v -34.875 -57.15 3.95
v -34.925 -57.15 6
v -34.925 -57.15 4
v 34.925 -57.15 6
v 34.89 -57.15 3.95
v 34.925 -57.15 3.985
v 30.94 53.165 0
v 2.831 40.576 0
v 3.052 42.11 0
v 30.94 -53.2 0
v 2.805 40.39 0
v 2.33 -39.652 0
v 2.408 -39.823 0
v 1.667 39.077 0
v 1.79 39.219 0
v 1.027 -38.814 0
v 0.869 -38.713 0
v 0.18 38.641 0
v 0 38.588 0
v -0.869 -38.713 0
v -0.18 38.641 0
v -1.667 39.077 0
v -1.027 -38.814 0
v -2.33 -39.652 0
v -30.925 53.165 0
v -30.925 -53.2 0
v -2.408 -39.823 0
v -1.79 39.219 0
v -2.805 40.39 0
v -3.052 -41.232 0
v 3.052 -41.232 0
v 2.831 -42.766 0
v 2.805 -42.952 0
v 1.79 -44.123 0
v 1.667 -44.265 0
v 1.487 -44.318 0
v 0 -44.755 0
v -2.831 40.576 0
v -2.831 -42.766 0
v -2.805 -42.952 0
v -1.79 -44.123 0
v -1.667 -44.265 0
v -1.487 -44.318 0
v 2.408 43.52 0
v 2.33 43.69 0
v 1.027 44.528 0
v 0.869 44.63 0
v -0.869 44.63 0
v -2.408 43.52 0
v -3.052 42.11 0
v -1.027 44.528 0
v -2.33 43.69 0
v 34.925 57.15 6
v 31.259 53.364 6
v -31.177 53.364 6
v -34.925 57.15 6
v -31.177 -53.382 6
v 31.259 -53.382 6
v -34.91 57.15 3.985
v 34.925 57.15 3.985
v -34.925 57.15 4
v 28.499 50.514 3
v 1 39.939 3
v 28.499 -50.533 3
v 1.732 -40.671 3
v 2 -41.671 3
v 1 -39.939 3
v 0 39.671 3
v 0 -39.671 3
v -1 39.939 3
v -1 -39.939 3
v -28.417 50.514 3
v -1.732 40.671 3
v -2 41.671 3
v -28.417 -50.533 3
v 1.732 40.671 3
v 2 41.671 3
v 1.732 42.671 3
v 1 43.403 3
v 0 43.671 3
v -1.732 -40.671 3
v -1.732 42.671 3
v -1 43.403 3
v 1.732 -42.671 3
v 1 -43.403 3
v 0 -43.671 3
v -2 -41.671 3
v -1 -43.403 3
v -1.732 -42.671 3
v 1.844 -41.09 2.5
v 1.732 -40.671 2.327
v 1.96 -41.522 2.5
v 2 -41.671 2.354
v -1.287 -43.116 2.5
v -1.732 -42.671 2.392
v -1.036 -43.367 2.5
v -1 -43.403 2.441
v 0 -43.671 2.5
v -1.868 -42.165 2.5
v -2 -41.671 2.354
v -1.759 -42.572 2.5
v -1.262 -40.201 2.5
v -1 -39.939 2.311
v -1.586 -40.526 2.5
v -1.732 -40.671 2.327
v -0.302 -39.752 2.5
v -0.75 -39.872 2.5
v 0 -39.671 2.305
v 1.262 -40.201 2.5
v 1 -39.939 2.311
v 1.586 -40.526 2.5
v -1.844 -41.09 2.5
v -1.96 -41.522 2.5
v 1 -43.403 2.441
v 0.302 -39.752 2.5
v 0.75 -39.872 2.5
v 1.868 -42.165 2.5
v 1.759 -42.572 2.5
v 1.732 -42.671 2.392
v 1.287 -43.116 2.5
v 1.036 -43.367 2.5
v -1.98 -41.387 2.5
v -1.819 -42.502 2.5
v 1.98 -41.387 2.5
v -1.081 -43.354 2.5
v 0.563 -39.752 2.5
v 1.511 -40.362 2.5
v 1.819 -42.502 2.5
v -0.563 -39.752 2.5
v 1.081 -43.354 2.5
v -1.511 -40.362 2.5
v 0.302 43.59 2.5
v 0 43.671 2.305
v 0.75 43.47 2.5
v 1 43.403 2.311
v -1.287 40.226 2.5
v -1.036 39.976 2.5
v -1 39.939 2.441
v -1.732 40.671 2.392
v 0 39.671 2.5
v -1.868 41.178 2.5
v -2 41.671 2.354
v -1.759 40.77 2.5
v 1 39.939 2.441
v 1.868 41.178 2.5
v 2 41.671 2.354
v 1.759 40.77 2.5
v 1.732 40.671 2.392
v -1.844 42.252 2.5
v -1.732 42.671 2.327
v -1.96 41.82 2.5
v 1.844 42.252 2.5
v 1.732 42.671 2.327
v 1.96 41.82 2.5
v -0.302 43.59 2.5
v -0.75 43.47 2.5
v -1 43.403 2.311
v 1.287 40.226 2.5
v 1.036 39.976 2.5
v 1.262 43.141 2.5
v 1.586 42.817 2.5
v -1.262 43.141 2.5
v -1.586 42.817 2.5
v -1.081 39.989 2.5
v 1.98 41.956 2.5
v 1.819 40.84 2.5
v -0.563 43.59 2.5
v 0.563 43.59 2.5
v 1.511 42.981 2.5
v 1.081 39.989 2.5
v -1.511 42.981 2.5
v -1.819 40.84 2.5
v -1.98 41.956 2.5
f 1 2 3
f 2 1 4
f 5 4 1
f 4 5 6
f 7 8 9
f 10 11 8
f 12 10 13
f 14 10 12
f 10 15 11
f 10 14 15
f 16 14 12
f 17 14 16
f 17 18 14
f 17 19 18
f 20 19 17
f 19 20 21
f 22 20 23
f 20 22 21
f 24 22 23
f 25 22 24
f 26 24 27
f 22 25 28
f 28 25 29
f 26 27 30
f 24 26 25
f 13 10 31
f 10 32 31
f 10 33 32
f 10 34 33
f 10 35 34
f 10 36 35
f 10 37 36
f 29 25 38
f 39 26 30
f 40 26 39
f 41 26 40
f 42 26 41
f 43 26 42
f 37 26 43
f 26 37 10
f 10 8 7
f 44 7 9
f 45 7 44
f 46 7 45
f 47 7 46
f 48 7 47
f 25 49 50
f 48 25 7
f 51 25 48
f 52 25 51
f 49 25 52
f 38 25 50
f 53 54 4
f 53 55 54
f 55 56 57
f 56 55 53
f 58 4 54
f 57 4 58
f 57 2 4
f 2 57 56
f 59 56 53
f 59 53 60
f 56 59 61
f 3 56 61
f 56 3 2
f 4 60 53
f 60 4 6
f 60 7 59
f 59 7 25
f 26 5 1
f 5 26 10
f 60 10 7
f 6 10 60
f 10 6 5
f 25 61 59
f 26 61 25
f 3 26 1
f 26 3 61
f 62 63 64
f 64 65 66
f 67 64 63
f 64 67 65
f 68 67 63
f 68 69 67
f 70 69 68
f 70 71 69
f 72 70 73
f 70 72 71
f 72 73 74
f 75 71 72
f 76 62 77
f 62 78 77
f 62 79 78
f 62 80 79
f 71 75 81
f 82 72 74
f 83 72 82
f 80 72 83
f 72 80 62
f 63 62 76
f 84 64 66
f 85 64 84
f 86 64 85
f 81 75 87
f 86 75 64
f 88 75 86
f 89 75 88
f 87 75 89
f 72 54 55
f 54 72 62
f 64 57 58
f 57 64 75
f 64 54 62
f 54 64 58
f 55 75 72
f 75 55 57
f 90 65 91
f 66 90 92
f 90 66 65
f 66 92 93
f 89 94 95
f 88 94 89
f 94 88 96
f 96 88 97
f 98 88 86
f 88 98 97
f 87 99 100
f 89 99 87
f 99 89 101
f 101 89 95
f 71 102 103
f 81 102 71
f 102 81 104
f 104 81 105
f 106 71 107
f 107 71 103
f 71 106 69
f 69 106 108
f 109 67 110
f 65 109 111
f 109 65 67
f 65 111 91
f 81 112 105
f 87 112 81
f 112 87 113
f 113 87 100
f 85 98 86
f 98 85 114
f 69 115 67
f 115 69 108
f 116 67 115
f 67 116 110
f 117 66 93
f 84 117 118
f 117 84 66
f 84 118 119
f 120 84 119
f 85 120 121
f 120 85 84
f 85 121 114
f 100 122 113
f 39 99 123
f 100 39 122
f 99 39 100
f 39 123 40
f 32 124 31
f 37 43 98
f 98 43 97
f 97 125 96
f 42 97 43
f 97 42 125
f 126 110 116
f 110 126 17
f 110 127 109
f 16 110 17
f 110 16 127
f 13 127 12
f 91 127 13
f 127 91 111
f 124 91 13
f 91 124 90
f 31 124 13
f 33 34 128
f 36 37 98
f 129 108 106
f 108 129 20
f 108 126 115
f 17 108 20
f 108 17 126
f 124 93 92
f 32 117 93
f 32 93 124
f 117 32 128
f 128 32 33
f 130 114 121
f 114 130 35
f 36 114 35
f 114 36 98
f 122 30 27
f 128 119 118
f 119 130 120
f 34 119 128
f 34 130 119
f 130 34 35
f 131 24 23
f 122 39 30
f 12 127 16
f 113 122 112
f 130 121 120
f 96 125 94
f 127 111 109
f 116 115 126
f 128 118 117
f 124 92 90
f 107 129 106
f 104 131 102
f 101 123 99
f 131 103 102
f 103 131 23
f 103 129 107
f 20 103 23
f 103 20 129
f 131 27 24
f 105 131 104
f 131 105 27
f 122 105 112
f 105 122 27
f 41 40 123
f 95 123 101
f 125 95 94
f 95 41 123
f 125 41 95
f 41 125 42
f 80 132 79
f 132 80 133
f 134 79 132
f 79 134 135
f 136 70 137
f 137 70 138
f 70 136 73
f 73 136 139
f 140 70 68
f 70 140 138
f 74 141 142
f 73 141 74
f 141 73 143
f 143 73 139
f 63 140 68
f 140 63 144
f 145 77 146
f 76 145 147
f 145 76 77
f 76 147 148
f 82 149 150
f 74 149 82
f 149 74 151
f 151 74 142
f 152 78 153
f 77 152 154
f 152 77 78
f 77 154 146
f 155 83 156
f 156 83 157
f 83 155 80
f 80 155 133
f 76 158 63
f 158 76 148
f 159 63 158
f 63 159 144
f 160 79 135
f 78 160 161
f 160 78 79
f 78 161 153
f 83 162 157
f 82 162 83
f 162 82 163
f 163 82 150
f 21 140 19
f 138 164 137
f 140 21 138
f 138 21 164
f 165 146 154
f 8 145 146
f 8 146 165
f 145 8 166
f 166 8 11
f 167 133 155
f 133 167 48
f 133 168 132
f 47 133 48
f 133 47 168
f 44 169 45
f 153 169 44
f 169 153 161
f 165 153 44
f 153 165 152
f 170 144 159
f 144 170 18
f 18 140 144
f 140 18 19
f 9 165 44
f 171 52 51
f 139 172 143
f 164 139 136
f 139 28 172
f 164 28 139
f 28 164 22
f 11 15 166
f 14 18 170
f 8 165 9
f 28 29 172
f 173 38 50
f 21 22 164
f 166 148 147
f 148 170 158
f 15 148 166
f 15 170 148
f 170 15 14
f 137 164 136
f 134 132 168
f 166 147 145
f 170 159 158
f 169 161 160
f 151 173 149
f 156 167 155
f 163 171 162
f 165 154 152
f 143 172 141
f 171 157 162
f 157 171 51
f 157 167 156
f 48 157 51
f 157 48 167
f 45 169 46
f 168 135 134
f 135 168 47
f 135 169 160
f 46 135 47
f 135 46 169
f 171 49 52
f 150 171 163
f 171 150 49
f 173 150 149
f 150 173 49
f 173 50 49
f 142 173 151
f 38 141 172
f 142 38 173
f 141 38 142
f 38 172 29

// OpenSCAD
// WALLY - Wall Plate Customizer v1.4
// by TheNewHobbyist 2013 (http://thenewhobbyist.com)
// http://www.thingiverse.com/thing:47956
// Modified by PaperGeek to add recessed screw option
//
// Most of the connectors used with this thing are panel mount connectors from
// www.DataPro.net I can't vouch for their quality but they did have easy to
// find dimensions for their products so I used them.
//
// This could be tightened up considerably but I thought I'd get it out there for people
// to experiment with before I lose my mind staring at it too long. Also this is my
// first OpenSCAD model so cut me some slack ;)
//
//   Notes:
//
// * The plug types "Duplex Outlet", "Long_Toggle Switch", "Toggle Switch", and "Rocker"
//   will all use the entire plate when selected in top or bottom configuration. The
//   other selection (if not "none" will be selected.
//
// * "None" and "Blank should not be considered equal. if "None" is selected for one of
//   the two holes on a plate the other selection will be centered on that plate. If
//   "Blank" is selected that plug location will remain blank but the other selection
//   will NOT move into a centered position.
//
//	Change Log:
//
//	v1.1
//	UPDATED: Screw hole locations for designer and toggle plate types.
//	UPDATED: Hole size for designer plate type.
//	UPDATED: Outlet hole spacing
//
//	v1.2
//	ADDED: Long Toggle Switch for laird
//
//	v1.3
//	ADDED: 3 new sizes for plate export: Standard, Junior-Jumbo, and Jumbo.
//
//  v1.4
//  ADDED (PaperGeek): Recessed screw option

  //////////////////////////
 // Customizer Settings: //
//////////////////////////

//How big are we talkin' here?
plate_width = 1; //	[1:5]

// Bigger hole in your wall? Try this
plate_size = 0; // [0:Standard, 1:Junior-Jumbo, 2:Jumbo]

//Pick a plug or full plate type
1st_plate = "none";  //	["none":None, "blank":Blank Port, "toggle":Full Plate - Toggle Switch, "long_toggle":Full Plate - Long Toggle Switch, "outlet":Full Plate - Duplex Outlet, "rocker":Full Plate - Rocker/Designer Plate, "keystone1":Keystone Jack, "vga":VGA Port, "hdmi":HDMI Port, "dvi":DVI-I Port, "displayport":Displayport, "cat5e":Cat5e/Cat6 Port, "usb-a":USB-A Port, "usb-b":USB-B Port, "firewire":Firewire IEEE 1394 Port, "db09":DB-09 Port, "ps2":PS2 Port, "f-type": F-Type/Coaxial Port,"svideo":S-Video Port, "stereo":Stereo Headphone Jack]
//Pick a bottom plug type or leave as none
1st_plate_bottom_hole = "none";  //	["none":None, "blank":Blank Port, "keystone1":Keystone Jack, "vga":VGA Port, "hdmi":HDMI Port, "dvi":DVI-I Port, "displayport":Displayport, "cat5e":Cat5e/Cat6 Port, "usb-a":USB-A Port, "usb-b":USB-B Port, "firewire":Firewire IEEE 1394 Port, "db09":DB-09 Port, "ps2":PS2 Port, "f-type": F-Type/Coaxial Port,"svideo":S-Video Port, "stereo":Stereo Headphone Jack]
//Pick a plug or full plate type
2nd_plate = "none";  //	["none":None, "blank":Blank Port, "toggle":Full Plate - Toggle Switch, "long_toggle":Full Plate - Long Toggle Switch, "outlet":Full Plate - Duplex Outlet, "rocker":Full Plate - Rocker/Designer Plate, "keystone1":Keystone Jack, "vga":VGA Port, "hdmi":HDMI Port, "dvi":DVI-I Port, "displayport":Displayport, "cat5e":Cat5e/Cat6 Port, "usb-a":USB-A Port, "usb-b":USB-B Port, "firewire":Firewire IEEE 1394 Port, "db09":DB-09 Port, "ps2":PS2 Port, "f-type": F-Type/Coaxial Port,"svideo":S-Video Port, "stereo":Stereo Headphone Jack]
//Pick a bottom plug type or leave as none
2nd_plate_bottom_hole = "none";  //	["none":None, "blank":Blank Port, "keystone1":Keystone Jack, "vga":VGA Port, "hdmi":HDMI Port, "dvi":DVI-I Port, "displayport":Displayport, "cat5e":Cat5e/Cat6 Port, "usb-a":USB-A Port, "usb-b":USB-B Port, "firewire":Firewire IEEE 1394 Port, "db09":DB-09 Port, "ps2":PS2 Port, "f-type": F-Type/Coaxial Port,"svideo":S-Video Port, "stereo":Stereo Headphone Jack]
//Pick a plug or full plate type
3rd_plate = "none";  //	["none":None, "blank":Blank Port, "toggle":Full Plate - Toggle Switch, "long_toggle":Full Plate - Long Toggle Switch, "outlet":Full Plate - Duplex Outlet, "rocker":Full Plate - Rocker/Designer Plate, "keystone1":Keystone Jack, "vga":VGA Port, "hdmi":HDMI Port, "dvi":DVI-I Port, "displayport":Displayport, "cat5e":Cat5e/Cat6 Port, "usb-a":USB-A Port, "usb-b":USB-B Port, "firewire":Firewire IEEE 1394 Port, "db09":DB-09 Port, "ps2":PS2 Port, "f-type": F-Type/Coaxial Port,"svideo":S-Video Port, "stereo":Stereo Headphone Jack]
//Pick a bottom plug type or leave as none
3rd_plate_bottom_hole = "none";  //	["none":None, "blank":Blank Port, "keystone1":Keystone Jack, "vga":VGA Port, "hdmi":HDMI Port, "dvi":DVI-I Port, "displayport":Displayport, "cat5e":Cat5e/Cat6 Port, "usb-a":USB-A Port, "usb-b":USB-B Port, "firewire":Firewire IEEE 1394 Port, "db09":DB-09 Port, "ps2":PS2 Port, "f-type": F-Type/Coaxial Port,"svideo":S-Video Port, "stereo":Stereo Headphone Jack]
//Pick a plug or full plate type
4th_plate = "none";  //["none":None, "blank":Blank Port, "toggle":Full Plate - Toggle Switch, "long_toggle":Full Plate - Long Toggle Switch, "outlet":Full Plate - Duplex Outlet, "rocker":Full Plate - Rocker/Designer Plate, "keystone1":Keystone Jack, "vga":VGA Port, "hdmi":HDMI Port, "dvi":DVI-I Port, "displayport":Displayport, "cat5e":Cat5e/Cat6 Port, "usb-a":USB-A Port, "usb-b":USB-B Port, "firewire":Firewire IEEE 1394 Port, "db09":DB-09 Port, "ps2":PS2 Port, "f-type": F-Type/Coaxial Port,"svideo":S-Video Port, "stereo":Stereo Headphone Jack]
//Pick a bottom plug type or leave as none
4th_plate_bottom_hole = "none";  //	["none":None, "blank":Blank Port, "keystone1":Keystone Jack, "vga":VGA Port, "hdmi":HDMI Port, "dvi":DVI-I Port, "displayport":Displayport, "cat5e":Cat5e/Cat6 Port, "usb-a":USB-A Port, "usb-b":USB-B Port, "firewire":Firewire IEEE 1394 Port, "db09":DB-09 Port, "ps2":PS2 Port, "f-type": F-Type/Coaxial Port,"svideo":S-Video Port, "stereo":Stereo Headphone Jack]
//Pick a plug or full plate type
5th_plate = "none";  //["none":None, "blank":Blank Port, "toggle":Full Plate - Toggle Switch, "long_toggle":Full Plate - Long Toggle Switch, "outlet":Full Plate - Duplex Outlet, "rocker":Full Plate - Rocker/Designer Plate, "keystone1":Keystone Jack, "vga":VGA Port, "hdmi":HDMI Port, "dvi":DVI-I Port, "displayport":Displayport, "cat5e":Cat5e/Cat6 Port, "usb-a":USB-A Port, "usb-b":USB-B Port, "firewire":Firewire IEEE 1394 Port, "db09":DB-09 Port, "ps2":PS2 Port, "f-type": F-Type/Coaxial Port,"svideo":S-Video Port, "stereo":Stereo Headphone Jack]
//Pick a bottom plug type or leave as none
5th_plate_bottom_hole = "none";  //	["none":None, "blank":Blank Port, "keystone1":Keystone Jack, "vga":VGA Port, "hdmi":HDMI Port, "dvi":DVI-I Port, "displayport":Displayport, "cat5e":Cat5e/Cat6 Port, "usb-a":USB-A Port, "usb-b":USB-B Port, "firewire":Firewire IEEE 1394 Port, "db09":DB-09 Port, "ps2":PS2 Port, "f-type": F-Type/Coaxial Port,"svideo":S-Video Port, "stereo":Stereo Headphone Jack]

// Screws can't reach? Try increasing screwhole recess in mm
screwhole_recess = 0; // [0:10]

  //////////////////////
 // Static Settings: //
//////////////////////

module GoAwayCustomizer() {
// This module is here to stop Customizer from picking up the variables below
}

l_offset = [34.925,39.6875,44.45];
r_offset = [34.925,39.6875,44.45];
spacer = [0,0,46.0375,92.075,138.1125,184.15];
solid_plate_width = l_offset[plate_size] + spacer[plate_width] + r_offset[plate_size];

height_sizes = [114.3,123.825,133.35];

height = 114.3; //plate height (static)
gang_width=[0,69.86,115.824,161.925,206.375,254]; // Plate widths (standard)

edgewidth = solid_plate_width + 10; // Bevel setting for top and bottom
rightbevel = solid_plate_width - 4; // Bevel for right side (scales)

left_offset = 34.925; // Offset first hole position
switch_offset = 46.0375; // Offset all additional holes
thinner_offset=[0,0.92,0.95,0.96,0.97,0.973]; // Manual fix for right side wackiness

positions=[height_sizes[plate_size]/2,height_sizes[plate_size]/2 - 14.25,height_sizes[plate_size]/2 + 14.25];

// preview[view:north, tilt:bottom]

  ///////////////////
 // Hole Control: //
///////////////////

module plate1(){
	if (1st_plate == "toggle" || 1st_plate_bottom_hole == "toggle"){
		translate([0,l_offset[plate_size],-screwhole_recess]) toggle_screws();
		translate([0,l_offset[plate_size],0]) hole("toggle");
		}
	else if (1st_plate == "long_toggle" || 1st_plate_bottom_hole == "long_toggle"){
		translate([0,l_offset[plate_size],0]) toggle_screws();
		translate([0,l_offset[plate_size],0]) hole("long_toggle");
		}
	else if (1st_plate == "rocker" || 1st_plate_bottom_hole == "rocker"){
		translate([0,l_offset[plate_size],0]) rocker_screws();
		translate([0,l_offset[plate_size],0]) hole("rocker");
		}
	else if (1st_plate == "outlet" || 1st_plate_bottom_hole == "outlet") {
	translate([0,l_offset[plate_size],0]) hole("outlet");
	}
	else if (1st_plate_bottom_hole == "none") {
		translate([0,l_offset[plate_size],0]) box_screws();
		translate([positions[0],l_offset[plate_size],0]) hole(1st_plate);
			}
	else if (1st_plate == "none") {
		translate([0,l_offset[plate_size],0]) box_screws();
		translate([positions[0],l_offset[plate_size],0]) hole(1st_plate_bottom_hole);
			}
	else {
	translate([0,l_offset[plate_size],0]) box_screws();
	translate([positions[1],l_offset[plate_size],0]) hole(1st_plate);
	translate([positions[2],l_offset[plate_size],0]) hole(1st_plate_bottom_hole);
	}
}

module plate2(){
	if (2nd_plate == "toggle" || 2nd_plate_bottom_hole == "toggle"){
		translate([0,l_offset[plate_size] + switch_offset,0]) toggle_screws();
		translate([0,l_offset[plate_size] + switch_offset,0]) hole("toggle");
		}
	else if (2nd_plate == "long_toggle" || 2nd_plate_bottom_hole == "long_toggle"){
		translate([0,l_offset[plate_size] + switch_offset,0]) toggle_screws();
		translate([0,l_offset[plate_size] + switch_offset,0]) hole("long_toggle");
		}
	else if (2nd_plate == "rocker" || 2nd_plate_bottom_hole == "rocker"){
		translate([0,l_offset[plate_size] + switch_offset,0]) rocker_screws();
		translate([0,l_offset[plate_size] + switch_offset,0]) hole("rocker");
		}
	else if (2nd_plate == "outlet" || 2nd_plate_bottom_hole == "outlet") {
	translate([0,l_offset[plate_size] + switch_offset,0]) hole("outlet");
	}
	else if (2nd_plate_bottom_hole == "none") {
		translate([0,l_offset[plate_size] + switch_offset,0]) box_screws();
		translate([positions[0],l_offset[plate_size] + switch_offset,0]) hole(2nd_plate);
			}
	else if (2nd_plate == "none") {
		translate([0,l_offset[plate_size] + switch_offset,0]) box_screws();
		translate([positions[0],l_offset[plate_size] + switch_offset,0]) hole(2nd_plate_bottom_hole);
			}
	else {
	translate([0,l_offset[plate_size] + switch_offset,0]) box_screws();
	translate([positions[1],l_offset[plate_size] + switch_offset,0]) hole(2nd_plate);
	translate([positions[2],l_offset[plate_size] + switch_offset,0]) hole(2nd_plate_bottom_hole);
	}
}

module plate3(){
	if (3rd_plate == "toggle" || 3rd_plate_bottom_hole == "toggle"){
		translate([0,l_offset[plate_size] + switch_offset * 2,0]) toggle_screws();
		translate([0,l_offset[plate_size] + switch_offset * 2,0]) hole("toggle");
		}
	else if (3rd_plate == "long_toggle" || 3rd_plate_bottom_hole == "long_toggle"){
		translate([0,l_offset[plate_size] + switch_offset * 2,0]) toggle_screws();
		translate([0,l_offset[plate_size] + switch_offset * 2,0]) hole("long_toggle");
		}
	else if (3rd_plate == "rocker" || 3rd_plate_bottom_hole == "rocker"){
		translate([0,l_offset[plate_size] + switch_offset * 2,0]) rocker_screws();
		translate([0,l_offset[plate_size] + switch_offset * 2,0]) hole("rocker");
		}
	else if (3rd_plate == "outlet" || 3rd_plate_bottom_hole == "outlet") {
	translate([0,l_offset[plate_size] + switch_offset * 2,0]) hole("outlet");
	}
	else if (3rd_plate_bottom_hole == "none") {
		translate([0,l_offset[plate_size] + switch_offset * 2,0]) box_screws();
		translate([positions[0],l_offset[plate_size] + switch_offset * 2,0]) hole(3rd_plate);
			}
	else if (3rd_plate == "none") {
		translate([0,l_offset[plate_size] + switch_offset * 2,0]) box_screws();
		translate([positions[0],l_offset[plate_size] + switch_offset * 2,0]) hole(3rd_plate_bottom_hole);
			}
	else {
	translate([0,l_offset[plate_size] + switch_offset * 2,0]) box_screws();
	translate([positions[1],l_offset[plate_size] + switch_offset * 2,0]) hole(3rd_plate);
	translate([positions[2],l_offset[plate_size] + switch_offset * 2,0]) hole(3rd_plate_bottom_hole);
	}
}

module plate4(){
	if (4th_plate == "toggle" || 4th_plate_bottom_hole == "toggle"){
		translate([0,l_offset[plate_size] + switch_offset * 3,0]) toggle_screws();
		translate([0,l_offset[plate_size] + switch_offset * 3,0]) hole("toggle");
		}
	else if (4th_plate == "long_toggle" || 4th_plate_bottom_hole == "long_toggle"){
		translate([0,l_offset[plate_size] + switch_offset * 3,0]) toggle_screws();
		translate([0,l_offset[plate_size] + switch_offset * 3,0]) hole("long_toggle");
		}
	else if (4th_plate == "rocker" || 4th_plate_bottom_hole == "rocker"){
		translate([0,l_offset[plate_size] + switch_offset * 3,0]) rocker_screws();
		translate([0,l_offset[plate_size] + switch_offset * 3,0]) hole("rocker");
		}
	else if (4th_plate == "outlet" || 4th_plate_bottom_hole == "outlet") {
	translate([0,l_offset[plate_size] + switch_offset * 3,0]) hole("outlet");
	}
	else if (4th_plate_bottom_hole == "none") {
		translate([0,l_offset[plate_size] + switch_offset * 3,0]) box_screws();
		translate([positions[0],l_offset[plate_size] + switch_offset * 3,0]) hole(4th_plate);
			}
	else if (4th_plate == "none") {
		translate([0,l_offset[plate_size] + switch_offset * 3,0]) box_screws();
		translate([positions[0],l_offset[plate_size] + switch_offset * 3,0]) hole(4th_plate_bottom_hole);
			}
	else {
	translate([0,l_offset[plate_size] + switch_offset * 3,0]) box_screws();
	translate([positions[1],l_offset[plate_size] + switch_offset * 3,0]) hole(4th_plate);
	translate([positions[2],l_offset[plate_size] + switch_offset * 3,0]) hole(4th_plate_bottom_hole);
	}
}

module plate5(){
	if (5th_plate == "toggle" || 5th_plate_bottom_hole == "toggle"){
		translate([0,l_offset[plate_size] + switch_offset * 4,0]) toggle_screws();
		translate([0,l_offset[plate_size] + switch_offset * 4,0]) hole("toggle");
		}
	else if (5th_plate == "long_toggle" || 5th_plate_bottom_hole == "long_toggle"){
		translate([0,l_offset[plate_size] + switch_offset * 4,0]) toggle_screws();
		translate([0,l_offset[plate_size] + switch_offset * 4,0]) hole("long_toggle");
		}
	else if (5th_plate == "rocker" || 5th_plate_bottom_hole == "rocker"){
		translate([0,l_offset[plate_size] + switch_offset * 4,0]) rocker_screws();
		translate([0,l_offset[plate_size] + switch_offset * 4,0]) hole("rocker");
		}
	else if (5th_plate == "outlet" || 5th_plate_bottom_hole == "outlet") {
	translate([0,l_offset[plate_size] + switch_offset * 4,0]) hole("outlet");
	}
	else if (5th_plate_bottom_hole == "none") {
		translate([0,l_offset[plate_size] + switch_offset * 4,0]) box_screws();
		translate([positions[0],l_offset[plate_size] + switch_offset * 4,0]) hole(5th_plate);
			}
	else if (5th_plate == "none") {
		translate([0,l_offset[plate_size] + switch_offset * 4,0]) box_screws();
		translate([positions[0],l_offset[plate_size] + switch_offset * 4,0]) hole(5th_plate_bottom_hole);
			}
	else {
	translate([0,l_offset[plate_size] + switch_offset * 4,0]) box_screws();
	translate([positions[1],l_offset[plate_size] + switch_offset * 4,0]) hole(5th_plate);
	translate([positions[2],l_offset[plate_size] + switch_offset * 4,0]) hole(5th_plate_bottom_hole);
	}
}

  /////////////////
 // SolidWorks: //
/////////////////

module plate1_solid(){
if (1st_plate == "keystone1" && 1st_plate_bottom_hole == "none") {
	translate([height_sizes[plate_size]/2 + 14.3,l_offset[plate_size] - 11.5,-3.9]) hole("keystone_solid");
	}
else if (1st_plate == "keystone1" && 1st_plate_bottom_hole != "outlet" && 1st_plate_bottom_hole != "toggle" && 1st_plate_bottom_hole != "rocker") {
	translate([height_sizes[plate_size]/2,l_offset[plate_size] - 11.5,-3.9]) hole("keystone_solid");
	}
if (1st_plate_bottom_hole == "keystone1" && 1st_plate == "none") {
	translate([height_sizes[plate_size]/2 + 14.3,l_offset[plate_size] - 11.5,-3.9]) hole("keystone_solid");
	}
else if (1st_plate_bottom_hole == "keystone1" && 1st_plate != "outlet" && 1st_plate != "toggle" && 1st_plate != "rocker") {
	translate([height_sizes[plate_size]/2 + 28.5,l_offset[plate_size] - 11.5,-3.9]) hole("keystone_solid");
	}

}

module plate2_solid(){
if (2nd_plate == "keystone1" && 2nd_plate_bottom_hole == "none") {
	translate([height_sizes[plate_size]/2 + 14.3,l_offset[plate_size] - 11.5 + switch_offset,-3.9]) hole("keystone_solid");
	}
else if (2nd_plate == "keystone1" && 2nd_plate_bottom_hole != "outlet" && 2nd_plate_bottom_hole != "toggle" && 2nd_plate_bottom_hole != "rocker") {
	translate([height_sizes[plate_size]/2,l_offset[plate_size] - 11.5 + switch_offset,-3.9]) hole("keystone_solid");
	}
if (2nd_plate_bottom_hole == "keystone1" && 2nd_plate == "none") {
	translate([height_sizes[plate_size]/2 + 14.3,l_offset[plate_size] - 11.5 + switch_offset,-3.9]) hole("keystone_solid");
	}
else if (2nd_plate_bottom_hole == "keystone1" && 2nd_plate != "outlet" && 2nd_plate != "toggle" && 2nd_plate != "rocker") {
	translate([height_sizes[plate_size]/2 + 28.5,l_offset[plate_size] - 11.5 + switch_offset,-3.9]) hole("keystone_solid");
	}

}

module plate3_solid(){
if (3rd_plate == "keystone1" && 3rd_plate_bottom_hole == "none") {
	translate([height_sizes[plate_size]/2 + 14.3,l_offset[plate_size] - 11.5 + switch_offset * 2,-3.9]) hole("keystone_solid");
	}
else if (3rd_plate == "keystone1" && 3rd_plate_bottom_hole != "outlet" && 3rd_plate_bottom_hole != "toggle" && 3rd_plate_bottom_hole != "rocker") {
	translate([height_sizes[plate_size]/2,l_offset[plate_size] - 11.5 + switch_offset * 2,-3.9]) hole("keystone_solid");
	}
if (3rd_plate_bottom_hole == "keystone1" && 3rd_plate == "none") {
	translate([height_sizes[plate_size]/2 + 14.3,l_offset[plate_size] - 11.5 + switch_offset * 2,-3.9]) hole("keystone_solid");
	}
else if (3rd_plate_bottom_hole == "keystone1" && 3rd_plate != "outlet" && 3rd_plate != "toggle" && 3rd_plate != "rocker") {
	translate([height_sizes[plate_size]/2 + 28.5,l_offset[plate_size] - 11.5 + switch_offset * 2,-3.9]) hole("keystone_solid");
	}

}

module plate4_solid(){
if (4th_plate == "keystone1" && 4th_plate_bottom_hole == "none") {
	translate([height_sizes[plate_size]/2 + 14.3,l_offset[plate_size] - 11.5 + switch_offset * 3,-3.9]) hole("keystone_solid");
	}
else if (4th_plate == "keystone1" && 4th_plate_bottom_hole != "outlet" && 4th_plate_bottom_hole != "toggle" && 4th_plate_bottom_hole != "rocker") {
	translate([height_sizes[plate_size]/2,l_offset[plate_size] - 11.5 + switch_offset * 3,-3.9]) hole("keystone_solid");
	}
if (4th_plate_bottom_hole == "keystone1" && 4th_plate == "none") {
	translate([height_sizes[plate_size]/2 + 14.3,l_offset[plate_size] - 11.5 + switch_offset * 3,-3.9]) hole("keystone_solid");
	}
else if (4th_plate_bottom_hole == "keystone1" && 4th_plate != "outlet" && 4th_plate != "toggle" && 4th_plate != "rocker") {
	translate([height_sizes[plate_size]/2 + 28.5,l_offset[plate_size] - 11.5 + switch_offset * 3,-3.9]) hole("keystone_solid");
	}

}

module plate5_solid(){
if (5th_plate == "keystone1" && 5th_plate_bottom_hole == "none") {
	translate([height_sizes[plate_size]/2 + 14.3,l_offset[plate_size] - 11.5 + switch_offset * 4,-3.9]) hole("keystone_solid");
	}
else if (5th_plate == "keystone1" && 5th_plate_bottom_hole != "outlet" && 5th_plate_bottom_hole != "toggle" && 5th_plate_bottom_hole != "rocker") {
	translate([height_sizes[plate_size]/2,l_offset[plate_size] - 11.5 + switch_offset * 4,-3.9]) hole("keystone_solid");
	}
if (5th_plate_bottom_hole == "keystone1" && 5th_plate == "none") {
	translate([height_sizes[plate_size]/2 + 14.3,l_offset[plate_size] - 11.5 + switch_offset * 4,-3.9]) hole("keystone_solid");
	}
else if (5th_plate_bottom_hole == "keystone1" && 5th_plate != "outlet" && 5th_plate != "toggle" && 5th_plate != "rocker") {
	translate([height_sizes[plate_size]/2 + 28.5,l_offset[plate_size] - 11.5 + switch_offset * 4,-3.9]) hole("keystone_solid");
	}

}

  ///////////////////
 // PlateStation: //
///////////////////

//Plate size and bevel
module plate() {
  union() {
	difference() {
		cube([height_sizes[plate_size],solid_plate_width,6]);
		translate([-4.3,-5,6.2]) rotate([0,45,0]) cube([6,edgewidth,6]); //Top Bevel
		translate([height_sizes[plate_size]-4.2,-5,6.25]) rotate([0,45,0]) cube([6,edgewidth,6]); //Bottom Bevel
		translate([height_sizes[plate_size]+10,-4.4,6.1]) rotate([0,45,90]) cube([6,height_sizes[plate_size]+20,6]); //Left Bevel (doesn't change)
		translate([height_sizes[plate_size]+10,rightbevel,6]) rotate([0,45,90]) cube([6,height_sizes[plate_size]+10,6]); //Right Bevel (scales right)
	}
  }
}
  


// Thinning Plate
module plate_inner() {
	scale([0.95,thinner_offset[plate_width],1]){
	translate([3,3,0]){
	difference() {
		cube([height_sizes[plate_size],solid_plate_width,6]);
		translate([-4.3,-5,6.2]) rotate([0,45,0]) cube([6,edgewidth,6]); //Top Bevel
		translate([height_sizes[plate_size]-4.2,-5,6.25]) rotate([0,45,0]) cube([6,edgewidth,6]); //Bottom Bevel
		translate([height_sizes[plate_size]+10,-4.4,6.1]) rotate([0,45,90]) cube([6,height_sizes[plate_size]+20,6]); //Left Bevel (doesn't change)
		translate([height_sizes[plate_size]+10,rightbevel,6]) rotate([0,45,90]) cube([6,height_sizes[plate_size]+10,6]); //Right Bevel (scales right)
				}
			}
		}
	}

// Box screw holes
module box_screws(){
	 translate([height_sizes[plate_size]/2 + 41.67125,0,-1]) cylinder(r=2, h=10, $fn=12);
	 translate([height_sizes[plate_size]/2 + 41.67125,0,3.5]) cylinder(r1=2, r2=3.3, h=3);
	 translate([height_sizes[plate_size]/2 - 41.67125,0,-1]) cylinder(r=2, h=10, $fn=12);
	 translate([height_sizes[plate_size]/2 - 41.67125,0,3.5]) cylinder(r1=2, r2=3.3, h=3);
}

// Rocker/Designer screw holes
module rocker_screws(){
	 translate([height_sizes[plate_size]/2 + 48.41875,0,-1]) cylinder(r=2, h=10, $fn=12);
	 translate([height_sizes[plate_size]/2 + 48.41875,0,3.5]) cylinder(r1=2, r2=3.3, h=3);
	 translate([height_sizes[plate_size]/2 - 48.41875,0,-1]) cylinder(r=2, h=10, $fn=12);
	 translate([height_sizes[plate_size]/2 - 48.41875,0,3.5]) cylinder(r1=2, r2=3.3, h=3);
}

// Toggle screw holes
module toggle_screws(){
	 translate([height_sizes[plate_size]/2 + 30.1625,0,-1]) cylinder(r=2, h=10, $fn=12);
	 translate([height_sizes[plate_size]/2 + 30.1625,0,3.5]) cylinder(r1=2, r2=3.3, h=3);
     translate([height_sizes[plate_size]/2 + 30.1625,0,6.0]) cylinder(r=3.6, h=10);
	 translate([height_sizes[plate_size]/2 - 30.1625,0,-1]) cylinder(r=2, h=10, $fn=12);
	 translate([height_sizes[plate_size]/2 - 30.1625,0,3.5]) cylinder(r1=2, r2=3.3, h=3);
     translate([height_sizes[plate_size]/2 - 30.1625,0,6.0]) cylinder(r=3.6, h=10);
}

  ///////////////
 // Portland: //
///////////////

// Hole Cutout definitions
module hole(hole_type) {


// Toggle switch hole
	if (hole_type == "toggle") {
		translate([height_sizes[plate_size]/2,0,0]) cube([23.8125,10.3188,15], center = true);
		 						}

// Toggle switch hole and screw holes
	if (hole_type == "long_toggle") {
		translate([height_sizes[plate_size]/2,0,0]) cube([43.6563,11.9063,15], center = true);
		 						}

// Rocker switch plate
	if (hole_type == "rocker") {
		translate([height_sizes[plate_size]/2,0,0]) cube([67.1,33.3,15], center = true);

		 						}

// Duplex power outlet plate or dual side toggles
	if (hole_type == "outlet" || hole_type == "dualsidetoggle") {
		translate([height_sizes[plate_size]/2 + 19.3915,0,0]) {
			difference() {
				cylinder(r=17.4625, h=15, center = true);
				translate([-24.2875,-15,-2]) cube([10,37,15], center = false);
				translate([14.2875,-15,-2]) cube([10,37,15], center = false);
								}
							}
		translate([height_sizes[plate_size]/2 - 19.3915,0,0]){
			difference(){
				cylinder(r=17.4625, h=15, center = true);
				translate([-24.2875,-15,-2]) cube([10,37,15], center = false);
				translate([14.2875,-15,-2]) cube([10,37,15], center = false);
								}
							}
		translate([height_sizes[plate_size]/2,0,-1]) cylinder(r=2, h=10);
		translate([height_sizes[plate_size]/2,0,3.5]) cylinder(r1=2, r2=3.3, h=3);
							}

// Blank plate
	if (hole_type == "blank") { }

// VGA & DB09 plate
// VGA Fits http://www.datapro.net/products/vga-dual-panel-mount-f-f-cable.html
// DB09 Fits http://www.datapro.net/products/db9-serial-panel-mount-male-extension.html
	if (hole_type == "vga" || hole_type == "db09") {

			translate([0,-12.5,3]) cylinder(r=1.75, h=10, center = true);
			translate([0,12.5,3]) cylinder(r=1.75, h=10, center = true);
				difference(){
					cube([10,19,13], center=true);
					translate([-5,-9.2,1]) rotate([0,0,-35.6]) cube([4.4,2.4,15], center=true);
					translate([.9,-11.2,0]) rotate([0,0,9.6]) cube([10,4.8,15], center=true);
					translate([4.6,-8.5,0]) rotate([0,0,37.2]) cube([4.4,2.4,15], center=true);
					translate([-5,9.2,1]) rotate([0,0,35.6]) cube([4.4,2.4,15], center=true);
					translate([0.9,11.2,0]) rotate([0,0,-9.6]) cube([10,4.8,15], center=true);
					translate([4.6,8.5,0]) rotate([0,0,-37.2]) cube([4.4,2.4,15], center=true);
								}
						}

// HDMI plate
// Fits http://www.datapro.net/products/hdmi-panel-mount-extension-cable.html
	if (hole_type == "hdmi") {
		translate([0,-13,3]) cylinder(r=1.75, h=10, center = true);
		translate([0,13,3]) cylinder(r=1.75, h=10, center = true);
		translate([0,0,3]) cube([6,16,10], center=true);
							}

// DVI-I plate
// Fits http://www.datapro.net/products/dvi-i-panel-mount-extension-cable.html
	if (hole_type == "dvi") {
		translate([0,-16,3]) cylinder(r=1.75, h=10, center = true);
		translate([0,16,3]) cylinder(r=1.75, h=10, center = true);
		translate([0,0,3]) cube([10,26,10], center=true);
							}

// DisplayPort plate
// Fits http://www.datapro.net/products/dvi-i-panel-mount-extension-cable.html
	if (hole_type == "displayport") {
		translate([0,-13.5,3]) cylinder(r=1.75, h=10, center = true);
		translate([0,13.5,3]) cylinder(r=1.75, h=10, center = true);
		translate([0,0,0]){
			difference(){
				translate([0,0,3]) cube([7,19,10], center=true);
				translate([2.47,-9.37,3]) rotate([0,0,-54.6]) cube([3,5,14], center=true);
						}
								}
									}

// USB-A Plate
// Fits http://www.datapro.net/products/usb-panel-mount-type-a-cable.html
	if (hole_type == "usb-a") {
		translate([0,-15,3]) cylinder(r=1.75, h=10, center = true);
		translate([0,15,3]) cylinder(r=1.75, h=10, center = true);
		translate([0,0,3]) cube([8,16,10], center=true);
							}

// USB-B Plate
// Fits http://www.datapro.net/products/usb-panel-mount-type-b-cable.html
	if (hole_type == "usb-b") {
		translate([0,-13,3]) cylinder(r=1.75, h=10, center = true);
		translate([0,13,3]) cylinder(r=1.75, h=10, center = true);
		translate([0,0,3]) cube([11,12,10], center=true);
							}

// 1394 Firewire Plate
// Fits http://www.datapro.net/products/firewire-panel-mount-extension.html
	if (hole_type == "firewire") {
		translate([0,-13.5,3]) cylinder(r=1.75, h=10, center = true);
		translate([0,13.5,3]) cylinder(r=1.75, h=10, center = true);
		translate([0,0,3]) cube([7,12,10], center=true);
							}

// F-Type / Cable TV Plate
// Fits http://www.datapro.net/products/f-type-panel-mounting-coupler.html
	if (hole_type == "f-type") {
		translate([0,0,3]) cylinder(r=4.7625, h=10, center=true);
							}

// Cat5e & Gat6 plate
// Cat5e Fits http://www.datapro.net/products/cat-5e-panel-mount-ethernet.html
// Cat6 Fits hhttp://www.datapro.net/products/cat-6-panel-mount-ethernet.html
	if (hole_type == "cat5e" || hole_type == "cat6") {
		translate([0,-12.5,3]) cylinder(r=1.75, h=10, center = true);
		translate([0,12.5,3]) cylinder(r=1.75, h=10, center = true);
		translate([0,0,3]) cube([15,15,10], center=true);
		}

// S-Video & PS2 plate
// S-Video Fits hhttp://www.datapro.net/products/cat-6-panel-mount-ethernet.html
// PS2 http://www.datapro.net/products/ps2-panel-mount-extension-cable.html
	if (hole_type == "svideo" || hole_type == "ps2") {
		translate([0,-10,3]) cylinder(r=1.75, h=10, center = true);
		translate([0,10,3]) cylinder(r=1.75, h=10, center = true);
		translate([0,0,3]) cylinder(r=5, h=10, center=true);
		}


// Stereo / 1/4" headphone jack coupler
// Stereo coupler Fits http://www.datapro.net/products/stereo-panel-mount-coupler.html
	if (hole_type == "stereo") {
		translate([0,0,3]) cylinder(r=2.985, h=10, center=true);
		}

//Keystone1 hole
//Hole for 1 Keystone Jack
	if (hole_type == "keystone1") {
		translate([0,0,5]) cube([16.5,15,10], center = true);
	}

//Keystone Solid
	if (hole_type == "keystone_solid") {
		rotate([0,0,90]) {
			difference(){
				translate([0,0,.1]) cube([23,30.5,9.8]);
					translate([4,4,0]){
						difference(){
							cube([15,22.5,10]);
							translate([-1,-0.001,3.501]) cube([17,2,6.5]);
							translate([-1,2.5,-3.40970]) rotate([45,0,0]) cube([17,2,6.5]);
							translate([-1,18.501,6.001]) cube([17,4,4]);
							translate([-1,20.5,0]) rotate([-45,0,0]) cube([17,2,6.5]);
						}
					}
				}
			}
		}

//End of module "hole"
}

  ////////////////////////
 // Number One ENGAGE: //
////////////////////////

// Rotate so it sits correctly on plate (whoops) and make upside down
rotate([0,180,90]){
// put plate at 0,0,0 for easier printing
translate([-height_sizes[plate_size]/2,-solid_plate_width/2,-6]){

if (plate_width == 1) {
	difference() {
		plate();
		translate([0,0,-3-min(screwhole_recess,2.99)]) plate_inner();
		plate1();
	}
	union() {
		plate1_solid();
	}
}

else if (plate_width == 2) {
    difference() {
        plate();
        translate([0,0,-3]) plate_inner();
        plate1();
        plate2();
    }
    union() {
		plate1_solid();
		plate2_solid();
	}
}

else if (plate_width == 3) {
    difference() {
        plate();
        translate([0,0,-3]) plate_inner();
        plate1();
        plate2();
        plate3();
    }
    union() {
		plate1_solid();
		plate2_solid();
		plate3_solid();
	}
}

else if (plate_width == 4) {
    difference() {
        plate();
        translate([0,0,-3]) plate_inner();
        plate1();
        plate2();
        plate3();
        plate4();
    }
    union() {
		plate1_solid();
		plate2_solid();
		plate3_solid();
		plate4_solid();
	}
}

else if (plate_width == 5) {
    difference() {
        plate();
        translate([0,0,-3]) plate_inner();
        plate1();
        plate2();
        plate3();
        plate4();
        plate5();
    }
    union() {
		plate1_solid();
		plate2_solid();
		plate3_solid();
		plate4_solid();
		plate5_solid();
	}
}

//End Rotate
}
//End Translate
}
